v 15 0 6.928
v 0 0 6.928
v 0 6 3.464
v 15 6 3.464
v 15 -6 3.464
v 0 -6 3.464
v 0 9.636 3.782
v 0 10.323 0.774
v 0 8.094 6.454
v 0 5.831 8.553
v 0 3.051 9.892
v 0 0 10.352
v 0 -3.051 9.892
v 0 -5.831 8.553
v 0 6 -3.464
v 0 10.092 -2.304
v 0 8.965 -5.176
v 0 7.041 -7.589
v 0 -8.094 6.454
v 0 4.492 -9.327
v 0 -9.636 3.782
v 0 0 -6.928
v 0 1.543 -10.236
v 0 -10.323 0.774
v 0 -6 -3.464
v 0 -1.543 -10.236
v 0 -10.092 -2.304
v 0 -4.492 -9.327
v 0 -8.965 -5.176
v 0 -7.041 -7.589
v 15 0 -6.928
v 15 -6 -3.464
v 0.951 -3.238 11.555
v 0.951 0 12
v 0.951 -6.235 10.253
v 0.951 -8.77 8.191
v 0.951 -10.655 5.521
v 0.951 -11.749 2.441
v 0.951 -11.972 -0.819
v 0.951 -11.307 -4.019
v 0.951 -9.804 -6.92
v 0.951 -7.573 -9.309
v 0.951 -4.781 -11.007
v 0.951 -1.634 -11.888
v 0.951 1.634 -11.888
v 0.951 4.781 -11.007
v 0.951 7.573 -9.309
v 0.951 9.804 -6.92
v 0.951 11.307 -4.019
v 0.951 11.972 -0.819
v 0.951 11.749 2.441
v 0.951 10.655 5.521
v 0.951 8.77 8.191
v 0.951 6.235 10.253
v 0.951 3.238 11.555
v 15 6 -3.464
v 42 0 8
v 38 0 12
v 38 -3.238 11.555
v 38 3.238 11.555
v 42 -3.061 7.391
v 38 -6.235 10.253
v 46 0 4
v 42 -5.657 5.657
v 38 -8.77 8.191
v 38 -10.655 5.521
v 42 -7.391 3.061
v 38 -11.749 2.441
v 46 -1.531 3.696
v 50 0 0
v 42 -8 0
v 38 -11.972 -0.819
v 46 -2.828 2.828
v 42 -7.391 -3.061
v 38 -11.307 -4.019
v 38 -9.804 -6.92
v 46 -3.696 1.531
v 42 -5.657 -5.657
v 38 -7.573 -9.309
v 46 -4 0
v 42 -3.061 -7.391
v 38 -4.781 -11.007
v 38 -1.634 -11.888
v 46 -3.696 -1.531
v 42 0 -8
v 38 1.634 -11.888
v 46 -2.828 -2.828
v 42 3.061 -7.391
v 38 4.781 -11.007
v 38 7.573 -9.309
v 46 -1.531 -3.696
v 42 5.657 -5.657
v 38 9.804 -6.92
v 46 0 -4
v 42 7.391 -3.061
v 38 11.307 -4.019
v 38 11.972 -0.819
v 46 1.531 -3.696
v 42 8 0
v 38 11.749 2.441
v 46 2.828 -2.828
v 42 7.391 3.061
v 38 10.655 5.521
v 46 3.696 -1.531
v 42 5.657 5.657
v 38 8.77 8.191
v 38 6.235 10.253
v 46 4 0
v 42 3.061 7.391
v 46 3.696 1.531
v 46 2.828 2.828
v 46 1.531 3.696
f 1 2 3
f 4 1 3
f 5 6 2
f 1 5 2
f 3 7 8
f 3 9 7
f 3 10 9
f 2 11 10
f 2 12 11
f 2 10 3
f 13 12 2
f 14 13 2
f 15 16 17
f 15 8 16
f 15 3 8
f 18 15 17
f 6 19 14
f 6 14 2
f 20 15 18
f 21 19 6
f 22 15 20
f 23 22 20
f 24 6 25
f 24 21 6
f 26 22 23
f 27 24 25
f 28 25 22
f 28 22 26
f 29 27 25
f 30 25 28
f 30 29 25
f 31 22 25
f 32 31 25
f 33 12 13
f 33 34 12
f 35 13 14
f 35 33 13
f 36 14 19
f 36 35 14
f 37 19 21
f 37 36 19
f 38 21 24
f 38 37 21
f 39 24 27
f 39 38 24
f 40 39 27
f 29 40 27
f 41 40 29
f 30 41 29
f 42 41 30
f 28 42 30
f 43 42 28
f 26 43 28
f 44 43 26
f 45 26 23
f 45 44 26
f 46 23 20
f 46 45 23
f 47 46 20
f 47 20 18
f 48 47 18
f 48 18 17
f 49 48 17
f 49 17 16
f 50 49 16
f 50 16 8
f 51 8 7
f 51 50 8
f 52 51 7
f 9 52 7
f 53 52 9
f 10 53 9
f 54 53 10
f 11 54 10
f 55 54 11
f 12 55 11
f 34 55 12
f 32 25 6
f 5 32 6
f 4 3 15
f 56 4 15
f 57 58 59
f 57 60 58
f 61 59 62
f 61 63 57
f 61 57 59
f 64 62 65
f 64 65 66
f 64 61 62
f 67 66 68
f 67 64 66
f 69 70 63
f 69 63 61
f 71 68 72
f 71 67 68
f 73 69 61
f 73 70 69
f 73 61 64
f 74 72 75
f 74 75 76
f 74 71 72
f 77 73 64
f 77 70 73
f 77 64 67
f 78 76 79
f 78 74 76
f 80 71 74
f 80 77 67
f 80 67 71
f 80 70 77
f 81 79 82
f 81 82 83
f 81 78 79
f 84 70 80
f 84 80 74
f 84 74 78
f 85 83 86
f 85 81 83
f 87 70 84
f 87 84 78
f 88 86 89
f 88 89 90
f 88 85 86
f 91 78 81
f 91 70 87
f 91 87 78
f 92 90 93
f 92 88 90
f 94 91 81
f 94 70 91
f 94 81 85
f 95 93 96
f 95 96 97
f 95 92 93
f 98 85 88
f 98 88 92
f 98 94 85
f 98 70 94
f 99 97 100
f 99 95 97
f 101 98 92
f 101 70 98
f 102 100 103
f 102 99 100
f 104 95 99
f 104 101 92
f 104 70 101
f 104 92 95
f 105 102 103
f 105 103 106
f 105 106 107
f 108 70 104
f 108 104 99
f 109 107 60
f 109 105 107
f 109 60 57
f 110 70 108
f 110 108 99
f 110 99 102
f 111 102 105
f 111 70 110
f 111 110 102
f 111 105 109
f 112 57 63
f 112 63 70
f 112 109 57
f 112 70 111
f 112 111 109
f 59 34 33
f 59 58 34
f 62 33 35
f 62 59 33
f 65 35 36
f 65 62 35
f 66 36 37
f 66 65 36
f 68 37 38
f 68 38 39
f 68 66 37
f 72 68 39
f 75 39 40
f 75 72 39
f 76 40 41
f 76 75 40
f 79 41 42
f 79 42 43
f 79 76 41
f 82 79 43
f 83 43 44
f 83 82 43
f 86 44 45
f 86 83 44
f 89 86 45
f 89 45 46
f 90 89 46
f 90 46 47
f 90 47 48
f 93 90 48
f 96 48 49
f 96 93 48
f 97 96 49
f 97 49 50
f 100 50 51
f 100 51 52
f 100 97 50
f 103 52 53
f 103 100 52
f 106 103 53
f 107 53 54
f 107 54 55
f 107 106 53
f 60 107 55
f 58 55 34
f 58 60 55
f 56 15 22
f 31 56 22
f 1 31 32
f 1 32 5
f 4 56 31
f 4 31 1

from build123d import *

# Parameters (mm, degrees)
HEX_2_DEPTH = 15


with BuildPart() as part:
    # BodySke → BaseBody (revolve)
    with BuildSketch(Plane.XY, mode=Mode.PRIVATE) as basebody_sk:
        Polygon((0, 0), (0, 10.352), (0.951473244, 12), (38, 12), (50, 0), align=None)
    revolve(basebody_sk.sketch.rotate(Axis((-12.7, 0, 0), (1, 0, 0)), 90), axis=Axis((-12.7, 0, 0), (1, 0, 0)))

    # Sketch2 → Hex 2 (cut)
    with BuildSketch(Plane.ZY):
        Polygon((3.464101615, 6), (-3.464101615, 6), (-6.92820323, 0), (-3.464101615, -6), (3.464101615, -6), (6.92820323, 0), align=None)
    extrude(amount=-HEX_2_DEPTH, mode=Mode.SUBTRACT)


solid = part.part
